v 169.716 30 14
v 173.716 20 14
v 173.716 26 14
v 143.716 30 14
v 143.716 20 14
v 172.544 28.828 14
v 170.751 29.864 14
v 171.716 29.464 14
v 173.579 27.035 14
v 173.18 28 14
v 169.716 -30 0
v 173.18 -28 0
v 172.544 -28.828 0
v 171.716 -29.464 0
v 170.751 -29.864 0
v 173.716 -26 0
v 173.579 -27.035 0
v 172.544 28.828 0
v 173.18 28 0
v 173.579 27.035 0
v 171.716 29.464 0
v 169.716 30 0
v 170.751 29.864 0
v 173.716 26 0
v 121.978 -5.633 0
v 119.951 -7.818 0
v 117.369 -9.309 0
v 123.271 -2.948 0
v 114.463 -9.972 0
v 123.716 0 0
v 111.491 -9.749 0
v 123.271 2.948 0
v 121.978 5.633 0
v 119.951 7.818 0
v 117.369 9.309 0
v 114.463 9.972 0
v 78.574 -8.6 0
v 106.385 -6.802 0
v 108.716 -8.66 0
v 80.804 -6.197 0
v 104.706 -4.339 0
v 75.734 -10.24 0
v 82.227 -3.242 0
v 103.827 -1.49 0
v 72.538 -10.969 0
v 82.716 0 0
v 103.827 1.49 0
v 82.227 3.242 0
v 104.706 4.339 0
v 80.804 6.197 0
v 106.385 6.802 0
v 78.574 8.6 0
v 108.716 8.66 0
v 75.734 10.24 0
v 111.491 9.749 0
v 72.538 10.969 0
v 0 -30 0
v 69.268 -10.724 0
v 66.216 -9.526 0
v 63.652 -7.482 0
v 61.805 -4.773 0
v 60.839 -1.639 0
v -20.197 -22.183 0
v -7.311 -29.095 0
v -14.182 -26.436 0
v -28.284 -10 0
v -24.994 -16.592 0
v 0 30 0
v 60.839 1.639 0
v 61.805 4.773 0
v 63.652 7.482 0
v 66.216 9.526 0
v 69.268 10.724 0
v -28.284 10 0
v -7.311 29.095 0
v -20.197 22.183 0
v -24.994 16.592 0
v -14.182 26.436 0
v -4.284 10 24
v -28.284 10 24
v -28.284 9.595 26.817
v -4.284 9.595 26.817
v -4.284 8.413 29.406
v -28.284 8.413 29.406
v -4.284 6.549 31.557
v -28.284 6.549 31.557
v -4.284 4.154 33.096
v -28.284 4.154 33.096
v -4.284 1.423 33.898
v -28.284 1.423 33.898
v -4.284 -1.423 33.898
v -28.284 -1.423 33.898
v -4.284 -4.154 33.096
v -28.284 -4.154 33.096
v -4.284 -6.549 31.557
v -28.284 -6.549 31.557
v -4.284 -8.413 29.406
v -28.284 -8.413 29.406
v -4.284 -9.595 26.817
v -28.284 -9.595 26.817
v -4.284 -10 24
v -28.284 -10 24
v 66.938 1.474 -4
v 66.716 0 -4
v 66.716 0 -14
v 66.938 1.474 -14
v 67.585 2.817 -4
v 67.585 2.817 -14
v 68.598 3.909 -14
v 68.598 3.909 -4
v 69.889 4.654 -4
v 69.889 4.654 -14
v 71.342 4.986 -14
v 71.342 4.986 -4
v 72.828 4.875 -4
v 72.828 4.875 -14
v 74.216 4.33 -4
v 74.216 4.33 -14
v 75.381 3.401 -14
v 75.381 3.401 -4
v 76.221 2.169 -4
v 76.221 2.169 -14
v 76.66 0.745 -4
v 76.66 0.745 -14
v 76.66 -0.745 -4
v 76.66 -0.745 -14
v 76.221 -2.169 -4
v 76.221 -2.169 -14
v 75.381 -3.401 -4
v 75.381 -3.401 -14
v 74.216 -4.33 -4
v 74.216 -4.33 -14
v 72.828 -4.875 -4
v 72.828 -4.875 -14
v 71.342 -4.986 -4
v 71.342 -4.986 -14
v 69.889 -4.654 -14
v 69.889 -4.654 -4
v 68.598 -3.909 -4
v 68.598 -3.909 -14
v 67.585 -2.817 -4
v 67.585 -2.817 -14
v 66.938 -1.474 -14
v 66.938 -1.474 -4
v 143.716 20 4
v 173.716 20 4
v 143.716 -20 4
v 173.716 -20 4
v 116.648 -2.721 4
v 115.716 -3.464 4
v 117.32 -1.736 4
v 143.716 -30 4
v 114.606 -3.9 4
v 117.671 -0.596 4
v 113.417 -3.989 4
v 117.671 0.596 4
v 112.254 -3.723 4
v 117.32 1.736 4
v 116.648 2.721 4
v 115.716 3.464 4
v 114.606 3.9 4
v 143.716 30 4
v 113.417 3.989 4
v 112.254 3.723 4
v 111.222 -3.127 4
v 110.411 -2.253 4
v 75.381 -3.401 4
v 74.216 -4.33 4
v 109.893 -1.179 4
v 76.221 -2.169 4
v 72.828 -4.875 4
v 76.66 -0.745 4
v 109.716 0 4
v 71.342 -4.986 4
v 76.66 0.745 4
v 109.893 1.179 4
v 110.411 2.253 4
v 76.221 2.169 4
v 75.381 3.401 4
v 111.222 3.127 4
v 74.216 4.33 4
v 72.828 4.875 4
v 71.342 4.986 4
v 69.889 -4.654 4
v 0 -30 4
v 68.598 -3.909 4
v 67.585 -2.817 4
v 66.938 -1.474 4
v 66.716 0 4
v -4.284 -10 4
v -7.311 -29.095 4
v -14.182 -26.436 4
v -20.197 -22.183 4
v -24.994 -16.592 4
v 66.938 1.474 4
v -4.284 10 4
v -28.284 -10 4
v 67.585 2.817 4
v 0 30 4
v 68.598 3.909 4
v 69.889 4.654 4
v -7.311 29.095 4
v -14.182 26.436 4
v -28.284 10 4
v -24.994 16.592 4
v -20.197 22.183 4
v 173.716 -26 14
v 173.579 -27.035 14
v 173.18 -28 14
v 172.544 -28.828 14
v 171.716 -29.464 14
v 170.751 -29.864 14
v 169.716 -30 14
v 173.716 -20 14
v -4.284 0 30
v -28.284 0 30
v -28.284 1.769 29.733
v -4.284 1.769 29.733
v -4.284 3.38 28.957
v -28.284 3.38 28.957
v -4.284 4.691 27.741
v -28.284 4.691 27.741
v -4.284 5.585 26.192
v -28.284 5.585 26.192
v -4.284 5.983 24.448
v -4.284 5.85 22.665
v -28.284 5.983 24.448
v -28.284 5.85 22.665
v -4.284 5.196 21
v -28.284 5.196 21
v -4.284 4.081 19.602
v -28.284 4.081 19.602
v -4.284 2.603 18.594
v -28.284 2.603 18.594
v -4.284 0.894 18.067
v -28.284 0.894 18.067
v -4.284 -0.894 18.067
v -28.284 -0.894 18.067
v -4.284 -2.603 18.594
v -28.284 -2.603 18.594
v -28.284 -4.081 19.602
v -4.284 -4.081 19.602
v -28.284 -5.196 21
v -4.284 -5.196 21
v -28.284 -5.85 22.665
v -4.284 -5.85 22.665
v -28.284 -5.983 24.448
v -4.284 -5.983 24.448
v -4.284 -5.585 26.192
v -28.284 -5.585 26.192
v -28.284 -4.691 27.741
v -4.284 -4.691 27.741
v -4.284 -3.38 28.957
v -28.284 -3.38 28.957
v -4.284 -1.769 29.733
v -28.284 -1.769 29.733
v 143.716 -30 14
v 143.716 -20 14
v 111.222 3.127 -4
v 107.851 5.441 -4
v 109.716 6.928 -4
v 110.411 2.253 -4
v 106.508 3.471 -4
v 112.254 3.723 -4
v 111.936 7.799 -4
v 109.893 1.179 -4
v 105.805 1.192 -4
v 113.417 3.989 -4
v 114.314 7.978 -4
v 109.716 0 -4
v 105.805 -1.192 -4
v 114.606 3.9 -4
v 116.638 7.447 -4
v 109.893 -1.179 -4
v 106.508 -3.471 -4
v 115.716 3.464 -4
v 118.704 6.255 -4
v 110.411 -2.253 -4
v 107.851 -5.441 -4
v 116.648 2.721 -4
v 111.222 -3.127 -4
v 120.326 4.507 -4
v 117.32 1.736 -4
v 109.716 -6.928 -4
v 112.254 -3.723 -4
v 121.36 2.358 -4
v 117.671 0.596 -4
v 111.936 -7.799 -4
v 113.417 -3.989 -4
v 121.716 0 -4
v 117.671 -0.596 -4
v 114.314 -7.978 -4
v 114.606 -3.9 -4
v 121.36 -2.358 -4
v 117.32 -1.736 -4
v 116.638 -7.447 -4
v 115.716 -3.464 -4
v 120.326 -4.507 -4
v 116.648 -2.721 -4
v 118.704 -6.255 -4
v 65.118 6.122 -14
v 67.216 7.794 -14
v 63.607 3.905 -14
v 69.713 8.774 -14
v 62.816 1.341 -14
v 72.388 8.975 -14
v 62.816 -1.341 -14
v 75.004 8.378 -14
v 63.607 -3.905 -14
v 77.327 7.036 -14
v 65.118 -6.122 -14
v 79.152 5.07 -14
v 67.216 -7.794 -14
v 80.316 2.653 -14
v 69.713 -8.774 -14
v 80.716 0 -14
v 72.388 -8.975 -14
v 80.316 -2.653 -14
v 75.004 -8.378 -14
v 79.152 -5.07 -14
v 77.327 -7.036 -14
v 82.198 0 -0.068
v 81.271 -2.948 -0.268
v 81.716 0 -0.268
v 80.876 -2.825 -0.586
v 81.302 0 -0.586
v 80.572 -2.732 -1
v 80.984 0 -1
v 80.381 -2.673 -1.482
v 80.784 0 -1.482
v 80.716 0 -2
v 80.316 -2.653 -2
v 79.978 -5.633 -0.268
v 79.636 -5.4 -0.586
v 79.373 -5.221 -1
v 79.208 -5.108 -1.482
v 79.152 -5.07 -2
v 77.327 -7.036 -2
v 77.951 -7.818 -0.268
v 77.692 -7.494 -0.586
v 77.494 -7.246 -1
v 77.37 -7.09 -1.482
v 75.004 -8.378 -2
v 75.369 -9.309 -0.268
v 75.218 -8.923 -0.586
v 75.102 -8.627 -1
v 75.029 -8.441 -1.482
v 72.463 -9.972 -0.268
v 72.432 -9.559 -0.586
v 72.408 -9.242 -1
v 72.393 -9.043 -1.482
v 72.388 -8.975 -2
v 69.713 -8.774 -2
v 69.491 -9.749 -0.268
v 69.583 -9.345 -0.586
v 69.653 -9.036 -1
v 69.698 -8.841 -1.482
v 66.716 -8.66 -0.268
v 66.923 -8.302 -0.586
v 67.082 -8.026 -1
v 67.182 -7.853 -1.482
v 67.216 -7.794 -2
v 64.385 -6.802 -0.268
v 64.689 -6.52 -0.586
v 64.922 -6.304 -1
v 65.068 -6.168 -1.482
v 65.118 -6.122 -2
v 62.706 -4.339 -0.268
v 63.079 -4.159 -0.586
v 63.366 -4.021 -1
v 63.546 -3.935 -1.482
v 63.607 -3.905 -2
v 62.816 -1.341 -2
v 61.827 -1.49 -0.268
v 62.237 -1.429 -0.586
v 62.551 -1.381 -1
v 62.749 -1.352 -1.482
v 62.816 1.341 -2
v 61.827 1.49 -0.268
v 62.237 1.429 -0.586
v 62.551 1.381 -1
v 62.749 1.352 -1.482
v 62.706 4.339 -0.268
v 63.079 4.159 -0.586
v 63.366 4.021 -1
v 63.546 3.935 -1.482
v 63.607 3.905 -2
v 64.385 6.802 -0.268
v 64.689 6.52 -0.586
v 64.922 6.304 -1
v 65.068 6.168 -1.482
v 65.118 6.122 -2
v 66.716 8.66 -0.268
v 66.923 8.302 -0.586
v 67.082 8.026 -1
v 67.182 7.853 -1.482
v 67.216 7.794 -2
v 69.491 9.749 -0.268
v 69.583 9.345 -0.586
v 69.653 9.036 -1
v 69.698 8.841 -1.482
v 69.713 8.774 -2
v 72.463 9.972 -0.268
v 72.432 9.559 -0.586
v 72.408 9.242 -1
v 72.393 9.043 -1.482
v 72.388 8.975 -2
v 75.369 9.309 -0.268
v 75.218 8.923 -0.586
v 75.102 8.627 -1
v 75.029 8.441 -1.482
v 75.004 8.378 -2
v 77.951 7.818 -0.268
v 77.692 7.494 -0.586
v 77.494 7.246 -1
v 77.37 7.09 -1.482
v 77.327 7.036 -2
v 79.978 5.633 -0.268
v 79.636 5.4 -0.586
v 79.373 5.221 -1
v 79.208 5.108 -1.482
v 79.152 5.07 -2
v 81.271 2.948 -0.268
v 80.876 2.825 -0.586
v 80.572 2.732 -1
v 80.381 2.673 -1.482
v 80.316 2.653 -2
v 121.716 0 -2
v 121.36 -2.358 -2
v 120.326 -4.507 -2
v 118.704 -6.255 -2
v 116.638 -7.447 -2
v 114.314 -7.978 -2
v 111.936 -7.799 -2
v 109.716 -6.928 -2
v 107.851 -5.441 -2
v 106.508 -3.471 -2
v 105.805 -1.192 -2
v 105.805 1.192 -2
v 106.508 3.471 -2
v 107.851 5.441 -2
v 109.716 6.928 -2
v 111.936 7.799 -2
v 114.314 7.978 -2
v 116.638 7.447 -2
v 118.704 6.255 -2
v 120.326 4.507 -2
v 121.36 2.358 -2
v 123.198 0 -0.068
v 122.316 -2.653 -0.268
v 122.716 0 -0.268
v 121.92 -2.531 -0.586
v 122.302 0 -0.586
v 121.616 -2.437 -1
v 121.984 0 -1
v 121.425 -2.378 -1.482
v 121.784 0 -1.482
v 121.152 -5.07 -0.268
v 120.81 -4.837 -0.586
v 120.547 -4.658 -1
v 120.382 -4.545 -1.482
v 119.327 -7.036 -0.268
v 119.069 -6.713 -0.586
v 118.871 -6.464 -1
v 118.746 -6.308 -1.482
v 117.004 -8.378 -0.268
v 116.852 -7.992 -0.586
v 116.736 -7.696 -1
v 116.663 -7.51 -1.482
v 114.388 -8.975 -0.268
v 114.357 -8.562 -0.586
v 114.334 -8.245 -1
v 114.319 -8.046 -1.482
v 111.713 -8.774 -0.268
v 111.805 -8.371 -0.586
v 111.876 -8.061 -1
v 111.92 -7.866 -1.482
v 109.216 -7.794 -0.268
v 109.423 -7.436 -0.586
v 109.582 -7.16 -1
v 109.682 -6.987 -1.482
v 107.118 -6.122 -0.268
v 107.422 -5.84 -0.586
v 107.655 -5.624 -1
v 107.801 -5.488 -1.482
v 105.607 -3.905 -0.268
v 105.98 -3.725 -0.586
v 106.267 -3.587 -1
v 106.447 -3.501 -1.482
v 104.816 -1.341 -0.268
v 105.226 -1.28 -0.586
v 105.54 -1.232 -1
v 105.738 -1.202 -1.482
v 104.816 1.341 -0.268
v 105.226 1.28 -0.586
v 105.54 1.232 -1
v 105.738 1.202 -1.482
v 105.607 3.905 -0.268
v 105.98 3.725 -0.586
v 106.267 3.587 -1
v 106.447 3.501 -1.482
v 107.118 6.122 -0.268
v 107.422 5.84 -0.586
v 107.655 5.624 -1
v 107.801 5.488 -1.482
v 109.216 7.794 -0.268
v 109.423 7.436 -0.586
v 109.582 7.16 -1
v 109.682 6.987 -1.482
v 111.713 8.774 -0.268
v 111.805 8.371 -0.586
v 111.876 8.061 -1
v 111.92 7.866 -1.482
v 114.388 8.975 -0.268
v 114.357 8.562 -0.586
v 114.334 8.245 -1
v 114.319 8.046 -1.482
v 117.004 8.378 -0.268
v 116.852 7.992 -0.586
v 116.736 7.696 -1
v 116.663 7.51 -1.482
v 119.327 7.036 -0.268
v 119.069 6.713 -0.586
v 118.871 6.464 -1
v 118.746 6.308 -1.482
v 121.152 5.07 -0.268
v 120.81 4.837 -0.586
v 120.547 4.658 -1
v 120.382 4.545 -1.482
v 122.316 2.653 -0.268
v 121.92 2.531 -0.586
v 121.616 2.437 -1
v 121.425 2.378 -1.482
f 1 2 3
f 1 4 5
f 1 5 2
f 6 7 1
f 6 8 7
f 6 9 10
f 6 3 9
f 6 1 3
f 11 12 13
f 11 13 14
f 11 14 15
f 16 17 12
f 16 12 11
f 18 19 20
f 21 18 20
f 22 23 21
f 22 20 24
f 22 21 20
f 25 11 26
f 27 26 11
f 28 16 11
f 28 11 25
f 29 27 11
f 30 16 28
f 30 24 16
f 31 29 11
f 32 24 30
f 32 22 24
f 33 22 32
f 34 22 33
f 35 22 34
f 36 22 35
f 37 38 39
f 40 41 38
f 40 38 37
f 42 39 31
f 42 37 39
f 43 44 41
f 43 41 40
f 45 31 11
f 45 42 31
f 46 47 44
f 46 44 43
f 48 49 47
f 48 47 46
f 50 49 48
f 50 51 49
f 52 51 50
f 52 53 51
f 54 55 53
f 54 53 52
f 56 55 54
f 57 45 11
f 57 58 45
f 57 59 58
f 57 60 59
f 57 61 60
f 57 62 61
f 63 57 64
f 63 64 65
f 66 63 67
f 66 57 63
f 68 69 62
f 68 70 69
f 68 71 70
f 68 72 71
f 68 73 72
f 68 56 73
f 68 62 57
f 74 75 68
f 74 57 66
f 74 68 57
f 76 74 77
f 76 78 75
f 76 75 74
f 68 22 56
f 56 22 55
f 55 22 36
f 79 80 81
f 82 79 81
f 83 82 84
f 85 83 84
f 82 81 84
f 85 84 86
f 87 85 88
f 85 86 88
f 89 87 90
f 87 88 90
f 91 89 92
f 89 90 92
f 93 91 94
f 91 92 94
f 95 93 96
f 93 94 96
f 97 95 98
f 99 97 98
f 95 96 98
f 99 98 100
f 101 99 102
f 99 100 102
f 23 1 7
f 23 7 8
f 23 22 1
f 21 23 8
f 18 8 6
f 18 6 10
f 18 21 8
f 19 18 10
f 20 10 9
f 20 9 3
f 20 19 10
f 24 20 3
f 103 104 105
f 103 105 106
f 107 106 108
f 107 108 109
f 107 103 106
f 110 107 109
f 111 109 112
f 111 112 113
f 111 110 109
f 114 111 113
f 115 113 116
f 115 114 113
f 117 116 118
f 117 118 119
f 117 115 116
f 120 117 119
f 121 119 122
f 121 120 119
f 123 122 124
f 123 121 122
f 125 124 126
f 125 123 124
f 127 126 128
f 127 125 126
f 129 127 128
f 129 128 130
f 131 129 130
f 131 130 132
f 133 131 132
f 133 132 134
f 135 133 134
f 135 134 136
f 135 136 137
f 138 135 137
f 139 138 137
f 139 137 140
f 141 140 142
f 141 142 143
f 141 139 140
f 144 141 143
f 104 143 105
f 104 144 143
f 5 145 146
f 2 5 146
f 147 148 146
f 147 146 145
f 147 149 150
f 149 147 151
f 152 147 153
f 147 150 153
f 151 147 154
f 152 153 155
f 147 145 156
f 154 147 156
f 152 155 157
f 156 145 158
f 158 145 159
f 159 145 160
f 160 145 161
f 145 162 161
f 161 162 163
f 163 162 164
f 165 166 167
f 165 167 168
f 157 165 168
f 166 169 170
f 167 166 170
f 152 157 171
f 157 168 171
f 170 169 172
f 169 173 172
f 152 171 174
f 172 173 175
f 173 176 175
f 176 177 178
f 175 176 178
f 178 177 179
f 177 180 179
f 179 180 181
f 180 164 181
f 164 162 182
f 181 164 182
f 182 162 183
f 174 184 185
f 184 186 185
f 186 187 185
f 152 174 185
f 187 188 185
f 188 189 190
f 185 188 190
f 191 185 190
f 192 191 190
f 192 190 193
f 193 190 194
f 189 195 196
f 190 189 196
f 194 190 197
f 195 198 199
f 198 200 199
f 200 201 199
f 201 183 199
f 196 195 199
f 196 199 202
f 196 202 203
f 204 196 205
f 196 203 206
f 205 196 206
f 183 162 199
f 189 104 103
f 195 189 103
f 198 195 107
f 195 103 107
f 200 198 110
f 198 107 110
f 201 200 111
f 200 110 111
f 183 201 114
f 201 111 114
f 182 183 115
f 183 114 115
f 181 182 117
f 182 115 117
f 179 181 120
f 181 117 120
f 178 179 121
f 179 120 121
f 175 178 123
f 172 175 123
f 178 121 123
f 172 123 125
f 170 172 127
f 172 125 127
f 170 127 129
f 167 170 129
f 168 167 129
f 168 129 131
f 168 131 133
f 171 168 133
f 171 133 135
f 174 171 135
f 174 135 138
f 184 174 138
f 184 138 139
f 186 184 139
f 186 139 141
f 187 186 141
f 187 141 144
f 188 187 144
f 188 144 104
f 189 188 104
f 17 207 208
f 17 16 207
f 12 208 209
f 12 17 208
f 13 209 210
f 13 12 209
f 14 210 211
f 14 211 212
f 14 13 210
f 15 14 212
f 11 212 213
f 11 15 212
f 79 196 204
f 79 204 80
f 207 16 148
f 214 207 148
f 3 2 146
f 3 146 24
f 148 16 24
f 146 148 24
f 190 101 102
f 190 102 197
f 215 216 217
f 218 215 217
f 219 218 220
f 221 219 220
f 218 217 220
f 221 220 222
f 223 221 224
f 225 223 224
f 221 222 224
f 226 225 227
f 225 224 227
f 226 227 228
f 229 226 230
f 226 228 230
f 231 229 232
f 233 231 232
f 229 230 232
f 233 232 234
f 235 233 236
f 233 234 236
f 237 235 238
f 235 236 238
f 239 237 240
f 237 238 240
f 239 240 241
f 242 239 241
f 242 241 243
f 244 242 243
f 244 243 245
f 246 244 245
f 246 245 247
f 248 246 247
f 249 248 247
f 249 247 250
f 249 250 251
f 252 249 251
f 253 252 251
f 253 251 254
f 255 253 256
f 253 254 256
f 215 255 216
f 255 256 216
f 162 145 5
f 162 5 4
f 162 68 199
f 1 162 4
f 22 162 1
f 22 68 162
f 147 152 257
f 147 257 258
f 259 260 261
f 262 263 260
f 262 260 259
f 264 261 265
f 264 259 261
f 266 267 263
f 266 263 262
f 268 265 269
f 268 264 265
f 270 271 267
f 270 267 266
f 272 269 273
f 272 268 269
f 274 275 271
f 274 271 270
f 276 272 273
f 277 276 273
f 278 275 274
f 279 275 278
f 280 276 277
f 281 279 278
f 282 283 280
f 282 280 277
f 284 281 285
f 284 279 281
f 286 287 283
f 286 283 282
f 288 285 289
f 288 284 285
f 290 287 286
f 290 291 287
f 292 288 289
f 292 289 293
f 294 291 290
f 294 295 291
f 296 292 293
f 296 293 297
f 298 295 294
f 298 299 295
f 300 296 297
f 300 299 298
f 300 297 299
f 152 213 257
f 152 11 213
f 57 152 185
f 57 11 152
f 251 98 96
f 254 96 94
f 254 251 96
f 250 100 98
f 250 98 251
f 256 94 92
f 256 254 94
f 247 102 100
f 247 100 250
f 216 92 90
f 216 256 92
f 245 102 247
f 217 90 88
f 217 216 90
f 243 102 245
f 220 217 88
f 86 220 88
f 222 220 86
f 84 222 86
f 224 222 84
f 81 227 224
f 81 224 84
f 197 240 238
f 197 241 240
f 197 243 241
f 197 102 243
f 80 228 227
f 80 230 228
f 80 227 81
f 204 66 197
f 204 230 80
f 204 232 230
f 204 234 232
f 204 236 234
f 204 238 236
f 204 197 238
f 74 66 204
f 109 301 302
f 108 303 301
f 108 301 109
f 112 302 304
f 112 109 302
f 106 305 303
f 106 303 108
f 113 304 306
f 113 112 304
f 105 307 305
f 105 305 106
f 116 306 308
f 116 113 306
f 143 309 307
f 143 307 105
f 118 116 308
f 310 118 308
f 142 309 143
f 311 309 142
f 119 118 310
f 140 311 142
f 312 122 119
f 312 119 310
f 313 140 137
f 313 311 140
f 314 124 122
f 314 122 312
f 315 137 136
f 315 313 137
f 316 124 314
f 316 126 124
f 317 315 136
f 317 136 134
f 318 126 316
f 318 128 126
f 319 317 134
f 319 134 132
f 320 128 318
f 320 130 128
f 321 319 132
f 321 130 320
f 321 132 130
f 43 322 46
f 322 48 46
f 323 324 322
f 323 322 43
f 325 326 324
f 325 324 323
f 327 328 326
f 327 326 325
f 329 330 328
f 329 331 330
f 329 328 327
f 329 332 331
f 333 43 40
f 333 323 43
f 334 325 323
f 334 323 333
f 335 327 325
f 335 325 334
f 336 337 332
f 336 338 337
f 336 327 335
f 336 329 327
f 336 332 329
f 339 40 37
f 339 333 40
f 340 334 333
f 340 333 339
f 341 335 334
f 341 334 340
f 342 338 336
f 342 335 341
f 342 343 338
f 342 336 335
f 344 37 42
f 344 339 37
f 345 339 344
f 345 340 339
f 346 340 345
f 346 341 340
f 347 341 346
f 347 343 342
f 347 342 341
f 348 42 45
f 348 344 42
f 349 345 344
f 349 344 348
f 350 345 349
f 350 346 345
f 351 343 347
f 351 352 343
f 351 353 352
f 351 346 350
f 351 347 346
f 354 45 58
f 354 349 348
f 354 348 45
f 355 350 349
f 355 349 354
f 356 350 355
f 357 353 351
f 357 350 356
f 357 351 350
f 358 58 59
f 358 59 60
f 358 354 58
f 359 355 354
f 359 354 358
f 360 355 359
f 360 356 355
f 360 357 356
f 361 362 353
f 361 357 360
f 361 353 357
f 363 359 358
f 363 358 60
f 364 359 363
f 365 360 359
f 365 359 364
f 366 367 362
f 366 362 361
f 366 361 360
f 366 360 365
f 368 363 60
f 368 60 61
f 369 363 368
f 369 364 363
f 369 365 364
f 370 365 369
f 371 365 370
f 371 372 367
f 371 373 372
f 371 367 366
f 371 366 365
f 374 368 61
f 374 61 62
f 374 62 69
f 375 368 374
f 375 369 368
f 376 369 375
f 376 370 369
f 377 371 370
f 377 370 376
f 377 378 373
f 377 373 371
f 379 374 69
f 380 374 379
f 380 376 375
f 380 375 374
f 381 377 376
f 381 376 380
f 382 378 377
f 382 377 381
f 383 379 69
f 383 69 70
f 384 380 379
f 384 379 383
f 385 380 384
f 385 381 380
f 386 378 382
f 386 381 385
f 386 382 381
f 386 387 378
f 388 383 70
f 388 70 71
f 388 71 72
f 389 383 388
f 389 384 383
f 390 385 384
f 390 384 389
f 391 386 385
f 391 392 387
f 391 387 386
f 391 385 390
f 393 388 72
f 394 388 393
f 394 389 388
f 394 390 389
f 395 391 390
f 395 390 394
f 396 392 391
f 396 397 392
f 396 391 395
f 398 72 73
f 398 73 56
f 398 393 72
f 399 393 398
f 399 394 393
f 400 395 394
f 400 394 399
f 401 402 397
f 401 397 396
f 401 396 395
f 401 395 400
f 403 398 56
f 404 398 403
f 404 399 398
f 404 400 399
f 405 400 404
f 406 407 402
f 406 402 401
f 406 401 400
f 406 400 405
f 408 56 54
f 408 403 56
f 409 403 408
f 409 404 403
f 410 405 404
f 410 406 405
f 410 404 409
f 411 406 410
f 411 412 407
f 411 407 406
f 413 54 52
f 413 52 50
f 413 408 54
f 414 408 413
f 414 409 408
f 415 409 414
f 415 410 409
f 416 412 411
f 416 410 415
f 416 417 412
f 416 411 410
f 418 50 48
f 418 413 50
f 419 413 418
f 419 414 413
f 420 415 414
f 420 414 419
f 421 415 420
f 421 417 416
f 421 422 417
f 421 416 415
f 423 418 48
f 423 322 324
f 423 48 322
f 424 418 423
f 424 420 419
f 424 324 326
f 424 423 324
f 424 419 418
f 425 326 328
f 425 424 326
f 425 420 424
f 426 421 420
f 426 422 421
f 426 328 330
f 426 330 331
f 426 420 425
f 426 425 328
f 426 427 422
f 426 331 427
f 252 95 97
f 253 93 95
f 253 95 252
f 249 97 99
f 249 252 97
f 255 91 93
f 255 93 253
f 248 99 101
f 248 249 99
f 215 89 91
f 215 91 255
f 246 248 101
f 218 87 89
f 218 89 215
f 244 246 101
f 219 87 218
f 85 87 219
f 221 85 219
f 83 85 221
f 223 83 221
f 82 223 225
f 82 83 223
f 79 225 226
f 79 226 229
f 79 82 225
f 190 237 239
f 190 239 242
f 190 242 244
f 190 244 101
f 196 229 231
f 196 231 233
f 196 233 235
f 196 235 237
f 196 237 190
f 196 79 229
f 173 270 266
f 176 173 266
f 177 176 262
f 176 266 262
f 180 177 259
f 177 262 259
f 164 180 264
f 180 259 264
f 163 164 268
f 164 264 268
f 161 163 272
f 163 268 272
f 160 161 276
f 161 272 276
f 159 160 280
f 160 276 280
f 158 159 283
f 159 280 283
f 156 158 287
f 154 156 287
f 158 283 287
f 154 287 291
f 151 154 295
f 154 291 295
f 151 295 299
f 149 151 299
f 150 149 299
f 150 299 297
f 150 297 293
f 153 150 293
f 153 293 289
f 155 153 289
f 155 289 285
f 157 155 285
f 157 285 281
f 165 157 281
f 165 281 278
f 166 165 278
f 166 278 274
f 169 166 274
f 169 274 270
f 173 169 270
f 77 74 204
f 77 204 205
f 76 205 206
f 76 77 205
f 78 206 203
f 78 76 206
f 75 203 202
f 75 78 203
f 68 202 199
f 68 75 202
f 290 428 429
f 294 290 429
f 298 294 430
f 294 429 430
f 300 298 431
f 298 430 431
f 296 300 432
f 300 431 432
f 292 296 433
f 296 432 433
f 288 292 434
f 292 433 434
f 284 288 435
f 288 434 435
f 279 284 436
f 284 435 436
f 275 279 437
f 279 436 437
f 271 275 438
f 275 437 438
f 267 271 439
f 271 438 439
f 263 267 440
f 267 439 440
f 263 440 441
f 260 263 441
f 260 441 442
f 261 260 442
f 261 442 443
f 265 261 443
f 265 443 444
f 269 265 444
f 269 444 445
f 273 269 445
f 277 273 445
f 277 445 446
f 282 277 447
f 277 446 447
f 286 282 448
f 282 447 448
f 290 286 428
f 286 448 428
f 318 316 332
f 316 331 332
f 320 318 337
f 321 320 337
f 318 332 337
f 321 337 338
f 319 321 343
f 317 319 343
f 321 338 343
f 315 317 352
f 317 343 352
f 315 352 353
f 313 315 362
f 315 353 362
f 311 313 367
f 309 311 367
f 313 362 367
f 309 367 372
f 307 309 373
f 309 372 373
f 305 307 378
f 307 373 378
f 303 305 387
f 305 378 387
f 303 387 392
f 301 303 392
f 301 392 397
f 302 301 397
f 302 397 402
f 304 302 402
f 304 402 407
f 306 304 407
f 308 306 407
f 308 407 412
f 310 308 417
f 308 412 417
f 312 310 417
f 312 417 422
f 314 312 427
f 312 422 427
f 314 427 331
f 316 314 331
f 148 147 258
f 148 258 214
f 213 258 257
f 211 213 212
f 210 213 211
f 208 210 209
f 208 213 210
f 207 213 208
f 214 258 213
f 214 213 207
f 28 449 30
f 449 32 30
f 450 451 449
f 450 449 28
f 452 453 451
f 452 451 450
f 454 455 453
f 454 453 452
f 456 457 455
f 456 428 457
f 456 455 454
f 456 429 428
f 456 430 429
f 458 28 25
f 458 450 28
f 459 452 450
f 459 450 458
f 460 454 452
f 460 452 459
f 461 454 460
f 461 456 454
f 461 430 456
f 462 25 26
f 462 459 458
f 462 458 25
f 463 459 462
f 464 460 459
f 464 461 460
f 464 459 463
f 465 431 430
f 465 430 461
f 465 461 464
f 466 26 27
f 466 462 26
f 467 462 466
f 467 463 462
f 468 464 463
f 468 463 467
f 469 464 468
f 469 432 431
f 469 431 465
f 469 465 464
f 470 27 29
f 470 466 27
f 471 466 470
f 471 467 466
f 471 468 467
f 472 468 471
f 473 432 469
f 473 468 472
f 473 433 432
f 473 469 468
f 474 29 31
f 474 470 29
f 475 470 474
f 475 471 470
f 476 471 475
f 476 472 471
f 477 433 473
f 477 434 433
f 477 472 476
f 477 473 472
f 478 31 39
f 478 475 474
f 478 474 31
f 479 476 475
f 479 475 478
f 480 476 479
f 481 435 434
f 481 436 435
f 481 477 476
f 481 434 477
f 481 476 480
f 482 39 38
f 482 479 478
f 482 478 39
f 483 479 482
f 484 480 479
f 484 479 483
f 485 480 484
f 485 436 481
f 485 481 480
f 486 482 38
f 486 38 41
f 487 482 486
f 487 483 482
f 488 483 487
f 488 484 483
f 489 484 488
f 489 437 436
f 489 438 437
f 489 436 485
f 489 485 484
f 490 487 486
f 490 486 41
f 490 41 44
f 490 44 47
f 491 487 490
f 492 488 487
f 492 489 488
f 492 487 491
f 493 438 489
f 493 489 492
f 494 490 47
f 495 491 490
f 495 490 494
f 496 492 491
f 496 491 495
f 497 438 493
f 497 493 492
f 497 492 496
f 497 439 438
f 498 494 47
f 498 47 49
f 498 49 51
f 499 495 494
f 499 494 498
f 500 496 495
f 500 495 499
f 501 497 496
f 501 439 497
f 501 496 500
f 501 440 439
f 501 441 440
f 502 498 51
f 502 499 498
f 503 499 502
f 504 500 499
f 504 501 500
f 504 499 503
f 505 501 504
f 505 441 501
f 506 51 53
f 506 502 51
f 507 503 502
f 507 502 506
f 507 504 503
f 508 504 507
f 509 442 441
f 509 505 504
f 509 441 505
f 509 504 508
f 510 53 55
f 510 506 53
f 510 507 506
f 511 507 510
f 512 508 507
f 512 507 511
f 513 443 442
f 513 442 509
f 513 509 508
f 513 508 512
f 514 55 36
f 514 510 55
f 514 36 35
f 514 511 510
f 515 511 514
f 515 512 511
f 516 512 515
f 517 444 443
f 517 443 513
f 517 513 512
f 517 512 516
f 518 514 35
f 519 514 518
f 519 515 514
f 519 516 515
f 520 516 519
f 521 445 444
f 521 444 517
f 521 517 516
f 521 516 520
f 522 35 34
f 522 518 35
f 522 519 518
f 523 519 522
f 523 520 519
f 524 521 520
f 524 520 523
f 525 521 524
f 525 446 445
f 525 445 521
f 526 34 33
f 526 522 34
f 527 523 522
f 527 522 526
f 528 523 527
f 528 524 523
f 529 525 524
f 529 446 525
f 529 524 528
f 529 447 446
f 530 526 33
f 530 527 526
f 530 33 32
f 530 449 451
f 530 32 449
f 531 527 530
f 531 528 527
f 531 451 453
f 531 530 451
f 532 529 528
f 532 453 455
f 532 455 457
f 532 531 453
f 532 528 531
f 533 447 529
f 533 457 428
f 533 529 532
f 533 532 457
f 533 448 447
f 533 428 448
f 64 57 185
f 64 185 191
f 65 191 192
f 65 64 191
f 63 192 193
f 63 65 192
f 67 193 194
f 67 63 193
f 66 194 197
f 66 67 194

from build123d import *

# Parameters (mm, degrees)
BASE_EXTRUSION_DEPTH    = 4
ESQUISSE2_W             = 30
ESQUISSE2_H             = 10
BOSS_EXTRU_1_DEPTH      = 10
ESQUISSE3_R             = 8
ESQUISSE3_R_2           = 9
BOSS_EXTRU_2_DEPTH      = 4
ESQUISSE4_R             = 4
ENL_V_MAT_EXTRU_1_DEPTH = 178.20370881
ESQUISSE5_R             = 5
ENL_V_MAT_EXTRU_2_DEPTH = 178.20370881
CONG_1_R                = 2
CONG_2_R                = 4
ESQUISSE6_R             = 6
BOSS_EXTRU_3_DEPTH      = 24
ESQUISSE7_R             = 9
ESQUISSE7_R_2           = 5
BOSS_EXTRU_4_DEPTH      = 10


with BuildPart() as part:
    # Esquisse1 → Base-Extrusion (new body)
    with BuildSketch(Plane.XY):
        with BuildLine():
            Line((0, 30), (173.715728753, 30))
            Line((173.715728753, 30), (173.715728753, -30))
            Line((173.715728753, -30), (0, -30))
            ThreePointArc((0, -30), (-17.320508076, -24.494897428), (-28.284271247, -10))
            Line((-28.284271247, -10), (-28.284271247, 10))
            ThreePointArc((-28.284271247, 10), (-17.320508076, 24.494897428), (0, 30))
        make_face()
    extrude(amount=BASE_EXTRUSION_DEPTH)

    # Esquisse2 → Boss.-Extru.1 (add)
    with BuildSketch(Plane.XY.offset(4)):
        with Locations((158.715728753, 25)):
            Rectangle(ESQUISSE2_W, ESQUISSE2_H)
        with Locations((158.715728753, -25)):
            Rectangle(ESQUISSE2_W, ESQUISSE2_H)
    extrude(amount=BOSS_EXTRU_1_DEPTH)

    # Esquisse3 → Boss.-Extru.2 (add)
    with BuildSketch(Plane(origin=(0, 0, 0), x_dir=(-1, 0, 0), z_dir=(0, 0, -1))):
        with Locations(Location((-113.715728753, 0, 0), (0, 0, 180))):
            Circle(ESQUISSE3_R)
        with Locations(Location((-71.715728753, 0, 0), (0, 0, 180))):
            Circle(ESQUISSE3_R_2)
    extrude(amount=BOSS_EXTRU_2_DEPTH)

    # Esquisse4 → Enlèv. mat.-Extru.1 (cut, through all)
    with BuildSketch(Plane(origin=(0, 0, -4), x_dir=(-1, 0, 0), z_dir=(0, 0, -1))):
        with Locations((-113.715728753, 0)):
            Circle(ESQUISSE4_R)
    extrude(amount=-ENL_V_MAT_EXTRU_1_DEPTH, mode=Mode.SUBTRACT)

    # Esquisse5 → Enlèv. mat.-Extru.2 (cut, through all)
    with BuildSketch(Plane(origin=(0, 0, -4), x_dir=(-1, 0, 0), z_dir=(0, 0, -1))):
        with Locations((-71.715728753, 0)):
            Circle(ESQUISSE5_R)
    extrude(amount=-ENL_V_MAT_EXTRU_2_DEPTH, mode=Mode.SUBTRACT)

    # Congé1
    cong_1_edges = [part.edges().sort_by_distance(p)[0] for p in [
        (105.715728753, 0, 0),
        (62.715728753, 0, 0),
    ]]
    fillet(cong_1_edges, radius=CONG_1_R)

    # Congé2
    cong_2_edges = [part.edges().sort_by_distance(p)[0] for p in [
        (173.715728753, 30, 7),
        (173.715728753, -30, 7),
    ]]
    fillet(cong_2_edges, radius=CONG_2_R)

    # Esquisse6 → Boss.-Extru.3 (add)
    with BuildSketch(Plane.ZY.offset(28.284271247)):
        with BuildLine():
            Line((0, 10), (24, 10))
            ThreePointArc((24, 10), (34, 0), (24, -10))
            Line((24, -10), (0, -10))
            Line((0, -10), (0, 10))
        make_face()
        with Locations((24, 0)):
            Circle(ESQUISSE6_R, mode=Mode.SUBTRACT)
    extrude(amount=-BOSS_EXTRU_3_DEPTH)

    # Esquisse7 → Boss.-Extru.4 (add)
    with BuildSketch(Plane(origin=(0, 0, -4), x_dir=(-1, 0, 0), z_dir=(0, 0, -1))):
        with Locations(Location((-71.715728753, 0, 0), (0, 0, 180))):
            Circle(ESQUISSE7_R)
        with Locations((-71.715728753, 0)):
            Circle(ESQUISSE7_R_2, mode=Mode.SUBTRACT)
    extrude(amount=BOSS_EXTRU_4_DEPTH)


solid = part.part
